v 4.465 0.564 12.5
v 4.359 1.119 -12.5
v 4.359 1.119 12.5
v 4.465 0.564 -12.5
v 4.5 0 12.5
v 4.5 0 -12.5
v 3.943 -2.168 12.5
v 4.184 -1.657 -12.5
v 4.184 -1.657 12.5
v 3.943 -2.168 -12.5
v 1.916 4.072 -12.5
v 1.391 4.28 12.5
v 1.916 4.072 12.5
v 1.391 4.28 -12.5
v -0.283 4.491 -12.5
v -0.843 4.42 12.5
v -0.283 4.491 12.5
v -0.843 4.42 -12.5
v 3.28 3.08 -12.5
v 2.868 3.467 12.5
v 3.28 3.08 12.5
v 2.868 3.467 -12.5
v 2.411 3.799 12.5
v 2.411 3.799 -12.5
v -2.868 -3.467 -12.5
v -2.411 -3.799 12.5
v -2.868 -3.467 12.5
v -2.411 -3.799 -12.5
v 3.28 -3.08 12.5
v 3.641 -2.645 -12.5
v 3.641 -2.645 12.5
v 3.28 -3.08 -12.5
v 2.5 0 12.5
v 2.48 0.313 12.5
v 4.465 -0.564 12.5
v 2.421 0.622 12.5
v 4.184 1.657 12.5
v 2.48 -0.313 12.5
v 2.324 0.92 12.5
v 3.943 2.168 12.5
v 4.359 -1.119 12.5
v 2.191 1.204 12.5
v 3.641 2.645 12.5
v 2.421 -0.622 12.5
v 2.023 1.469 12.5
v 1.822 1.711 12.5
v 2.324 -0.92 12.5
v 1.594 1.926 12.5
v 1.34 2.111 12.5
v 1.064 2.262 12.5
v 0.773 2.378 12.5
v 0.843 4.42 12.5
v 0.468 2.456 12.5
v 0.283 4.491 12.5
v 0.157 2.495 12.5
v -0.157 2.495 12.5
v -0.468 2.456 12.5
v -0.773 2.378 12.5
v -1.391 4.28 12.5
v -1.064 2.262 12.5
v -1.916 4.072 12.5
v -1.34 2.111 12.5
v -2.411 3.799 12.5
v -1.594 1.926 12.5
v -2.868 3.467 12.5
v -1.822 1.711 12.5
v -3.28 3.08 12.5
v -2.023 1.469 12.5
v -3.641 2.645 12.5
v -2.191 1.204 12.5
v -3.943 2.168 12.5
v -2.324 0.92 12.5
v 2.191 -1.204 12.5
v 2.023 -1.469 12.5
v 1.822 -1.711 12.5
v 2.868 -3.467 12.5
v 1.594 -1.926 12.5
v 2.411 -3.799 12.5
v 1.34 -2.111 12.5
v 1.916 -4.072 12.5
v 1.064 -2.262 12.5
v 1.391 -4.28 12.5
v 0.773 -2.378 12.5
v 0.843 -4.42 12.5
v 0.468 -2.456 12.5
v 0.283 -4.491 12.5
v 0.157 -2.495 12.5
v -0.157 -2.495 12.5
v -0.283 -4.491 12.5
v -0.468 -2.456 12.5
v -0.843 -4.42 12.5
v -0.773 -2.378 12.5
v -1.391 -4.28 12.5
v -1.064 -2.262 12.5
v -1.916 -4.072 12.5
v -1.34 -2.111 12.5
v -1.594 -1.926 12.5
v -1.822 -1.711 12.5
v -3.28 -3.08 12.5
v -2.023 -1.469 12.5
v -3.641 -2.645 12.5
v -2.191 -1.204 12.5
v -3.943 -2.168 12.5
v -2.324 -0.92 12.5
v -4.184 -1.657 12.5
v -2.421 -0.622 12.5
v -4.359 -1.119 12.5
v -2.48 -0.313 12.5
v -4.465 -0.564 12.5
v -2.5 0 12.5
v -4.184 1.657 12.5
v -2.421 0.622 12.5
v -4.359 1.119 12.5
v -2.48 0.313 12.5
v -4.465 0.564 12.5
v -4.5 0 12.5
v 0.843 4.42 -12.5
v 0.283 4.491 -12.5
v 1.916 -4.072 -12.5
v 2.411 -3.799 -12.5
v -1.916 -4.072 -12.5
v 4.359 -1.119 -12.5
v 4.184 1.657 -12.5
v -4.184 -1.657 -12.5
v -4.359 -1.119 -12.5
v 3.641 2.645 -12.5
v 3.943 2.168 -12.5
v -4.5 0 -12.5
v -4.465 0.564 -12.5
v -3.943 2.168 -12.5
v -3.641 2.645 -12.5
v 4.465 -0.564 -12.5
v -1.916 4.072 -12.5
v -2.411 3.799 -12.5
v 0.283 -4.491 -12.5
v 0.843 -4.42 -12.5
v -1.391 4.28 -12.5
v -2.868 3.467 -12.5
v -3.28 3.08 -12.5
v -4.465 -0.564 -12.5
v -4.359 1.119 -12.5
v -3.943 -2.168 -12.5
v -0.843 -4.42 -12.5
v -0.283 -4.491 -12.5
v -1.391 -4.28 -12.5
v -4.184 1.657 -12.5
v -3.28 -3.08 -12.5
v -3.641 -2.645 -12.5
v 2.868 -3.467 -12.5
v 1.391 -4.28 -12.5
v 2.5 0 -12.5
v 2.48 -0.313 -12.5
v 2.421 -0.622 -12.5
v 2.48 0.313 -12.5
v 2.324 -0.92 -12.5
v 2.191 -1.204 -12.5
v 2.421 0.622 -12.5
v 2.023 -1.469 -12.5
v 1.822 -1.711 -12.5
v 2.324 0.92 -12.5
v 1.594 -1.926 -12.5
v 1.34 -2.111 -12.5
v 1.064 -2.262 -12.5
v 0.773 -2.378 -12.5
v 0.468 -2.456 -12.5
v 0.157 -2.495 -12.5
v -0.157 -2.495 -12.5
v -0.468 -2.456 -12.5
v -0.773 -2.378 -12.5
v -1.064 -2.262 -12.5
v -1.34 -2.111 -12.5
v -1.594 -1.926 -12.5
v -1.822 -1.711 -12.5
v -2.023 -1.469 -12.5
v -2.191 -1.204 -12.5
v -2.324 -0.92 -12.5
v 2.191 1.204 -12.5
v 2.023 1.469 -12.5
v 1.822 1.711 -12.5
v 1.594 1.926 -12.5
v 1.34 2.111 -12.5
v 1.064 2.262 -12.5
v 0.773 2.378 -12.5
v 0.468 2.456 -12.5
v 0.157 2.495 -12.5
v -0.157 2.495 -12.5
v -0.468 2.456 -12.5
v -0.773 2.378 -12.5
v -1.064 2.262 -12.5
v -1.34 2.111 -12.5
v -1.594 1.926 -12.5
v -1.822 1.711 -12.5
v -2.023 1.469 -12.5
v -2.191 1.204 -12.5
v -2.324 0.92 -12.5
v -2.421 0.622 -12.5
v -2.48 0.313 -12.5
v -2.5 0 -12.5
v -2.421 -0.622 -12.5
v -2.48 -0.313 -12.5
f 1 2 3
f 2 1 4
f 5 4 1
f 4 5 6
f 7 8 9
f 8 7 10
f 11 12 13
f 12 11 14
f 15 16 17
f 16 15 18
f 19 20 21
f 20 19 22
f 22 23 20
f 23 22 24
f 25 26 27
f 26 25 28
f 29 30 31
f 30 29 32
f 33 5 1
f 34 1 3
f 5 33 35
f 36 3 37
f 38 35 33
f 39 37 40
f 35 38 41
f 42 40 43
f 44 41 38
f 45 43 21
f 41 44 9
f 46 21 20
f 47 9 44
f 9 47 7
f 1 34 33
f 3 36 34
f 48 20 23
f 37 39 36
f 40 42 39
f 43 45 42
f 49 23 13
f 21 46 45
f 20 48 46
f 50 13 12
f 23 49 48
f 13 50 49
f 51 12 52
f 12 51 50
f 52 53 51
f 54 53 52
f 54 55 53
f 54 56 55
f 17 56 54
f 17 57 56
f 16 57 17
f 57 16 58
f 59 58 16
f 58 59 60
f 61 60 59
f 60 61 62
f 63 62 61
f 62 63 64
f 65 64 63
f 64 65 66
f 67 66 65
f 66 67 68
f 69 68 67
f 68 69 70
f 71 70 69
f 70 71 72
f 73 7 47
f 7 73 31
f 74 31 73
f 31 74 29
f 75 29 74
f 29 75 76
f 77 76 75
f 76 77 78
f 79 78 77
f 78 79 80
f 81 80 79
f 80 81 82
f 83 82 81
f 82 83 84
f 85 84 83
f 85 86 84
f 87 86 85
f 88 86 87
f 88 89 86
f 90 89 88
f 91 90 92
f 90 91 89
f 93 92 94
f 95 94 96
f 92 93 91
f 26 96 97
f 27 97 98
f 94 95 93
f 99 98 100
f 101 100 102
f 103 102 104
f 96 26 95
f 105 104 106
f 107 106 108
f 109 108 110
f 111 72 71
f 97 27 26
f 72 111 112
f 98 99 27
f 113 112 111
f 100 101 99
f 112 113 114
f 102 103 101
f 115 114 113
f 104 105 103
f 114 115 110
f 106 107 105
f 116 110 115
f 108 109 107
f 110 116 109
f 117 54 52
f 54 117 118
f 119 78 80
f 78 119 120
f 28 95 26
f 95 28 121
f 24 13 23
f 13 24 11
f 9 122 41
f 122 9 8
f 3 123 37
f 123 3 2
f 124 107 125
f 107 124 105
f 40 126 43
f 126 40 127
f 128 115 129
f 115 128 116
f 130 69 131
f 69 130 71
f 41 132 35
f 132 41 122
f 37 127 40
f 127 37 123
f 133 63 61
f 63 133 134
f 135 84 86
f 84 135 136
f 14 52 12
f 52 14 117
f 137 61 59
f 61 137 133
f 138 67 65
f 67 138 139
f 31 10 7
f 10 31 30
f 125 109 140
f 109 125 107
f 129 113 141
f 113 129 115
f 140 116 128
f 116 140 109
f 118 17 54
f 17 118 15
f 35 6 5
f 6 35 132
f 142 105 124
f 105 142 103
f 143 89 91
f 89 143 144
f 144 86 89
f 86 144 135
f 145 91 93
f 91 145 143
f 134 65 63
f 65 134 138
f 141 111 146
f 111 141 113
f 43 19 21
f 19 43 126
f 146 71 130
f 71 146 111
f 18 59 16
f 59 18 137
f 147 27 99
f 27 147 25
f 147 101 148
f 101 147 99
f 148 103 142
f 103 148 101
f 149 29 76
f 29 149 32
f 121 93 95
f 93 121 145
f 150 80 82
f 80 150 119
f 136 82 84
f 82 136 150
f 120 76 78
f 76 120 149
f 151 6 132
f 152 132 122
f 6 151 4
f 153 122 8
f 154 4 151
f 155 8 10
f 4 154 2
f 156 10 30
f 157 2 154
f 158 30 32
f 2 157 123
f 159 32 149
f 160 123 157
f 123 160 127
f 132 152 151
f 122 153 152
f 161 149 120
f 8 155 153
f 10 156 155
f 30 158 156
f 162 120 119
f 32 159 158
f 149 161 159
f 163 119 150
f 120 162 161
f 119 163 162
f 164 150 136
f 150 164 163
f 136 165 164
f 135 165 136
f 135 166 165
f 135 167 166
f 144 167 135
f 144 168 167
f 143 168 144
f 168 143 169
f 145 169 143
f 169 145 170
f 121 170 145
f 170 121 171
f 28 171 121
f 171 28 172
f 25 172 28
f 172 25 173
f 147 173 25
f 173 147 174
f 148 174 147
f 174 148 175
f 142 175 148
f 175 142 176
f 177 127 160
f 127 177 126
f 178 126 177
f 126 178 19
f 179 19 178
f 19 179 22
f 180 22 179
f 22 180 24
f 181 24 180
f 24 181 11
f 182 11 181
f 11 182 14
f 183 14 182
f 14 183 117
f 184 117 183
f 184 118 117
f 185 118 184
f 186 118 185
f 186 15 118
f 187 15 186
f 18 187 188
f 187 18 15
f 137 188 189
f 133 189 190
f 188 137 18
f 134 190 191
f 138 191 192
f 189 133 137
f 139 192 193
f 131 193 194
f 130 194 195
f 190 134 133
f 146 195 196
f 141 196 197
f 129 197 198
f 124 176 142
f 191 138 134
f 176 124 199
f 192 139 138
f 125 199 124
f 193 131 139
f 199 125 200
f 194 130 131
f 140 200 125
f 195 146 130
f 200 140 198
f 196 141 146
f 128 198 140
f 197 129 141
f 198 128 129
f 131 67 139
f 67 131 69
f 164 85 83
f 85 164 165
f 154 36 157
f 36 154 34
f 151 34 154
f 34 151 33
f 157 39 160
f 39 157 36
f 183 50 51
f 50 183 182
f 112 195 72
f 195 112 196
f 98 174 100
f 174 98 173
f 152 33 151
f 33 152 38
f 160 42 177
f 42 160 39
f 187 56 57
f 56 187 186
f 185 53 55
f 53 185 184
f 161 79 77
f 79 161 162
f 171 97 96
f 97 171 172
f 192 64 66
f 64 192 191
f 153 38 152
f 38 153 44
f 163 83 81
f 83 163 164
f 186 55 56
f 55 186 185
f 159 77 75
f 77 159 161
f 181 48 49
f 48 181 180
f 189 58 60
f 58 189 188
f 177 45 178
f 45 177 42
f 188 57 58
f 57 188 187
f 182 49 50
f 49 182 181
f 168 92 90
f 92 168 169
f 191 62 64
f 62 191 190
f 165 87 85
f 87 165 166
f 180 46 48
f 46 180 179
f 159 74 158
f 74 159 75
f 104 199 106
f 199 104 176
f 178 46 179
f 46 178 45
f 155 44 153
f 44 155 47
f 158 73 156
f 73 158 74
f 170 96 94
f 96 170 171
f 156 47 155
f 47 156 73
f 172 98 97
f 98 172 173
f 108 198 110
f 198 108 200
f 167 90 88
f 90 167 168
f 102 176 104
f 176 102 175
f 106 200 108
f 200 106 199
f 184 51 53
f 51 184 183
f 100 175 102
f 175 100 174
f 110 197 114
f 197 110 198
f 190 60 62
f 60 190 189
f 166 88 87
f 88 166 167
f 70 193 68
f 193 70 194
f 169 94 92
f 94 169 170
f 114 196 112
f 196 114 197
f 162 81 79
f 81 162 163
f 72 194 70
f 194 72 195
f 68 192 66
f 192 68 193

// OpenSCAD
$fn = 50;


difference() {
	union() {
		translate(v = [0, 0, -12.5000000000]) {
			cylinder(h = 25, r = 4.5000000000);
		}
	}
	union() {
		translate(v = [0, 0, -100.0000000000]) {
			cylinder(h = 200, r = 2.5000000000);
		}
	}
}
